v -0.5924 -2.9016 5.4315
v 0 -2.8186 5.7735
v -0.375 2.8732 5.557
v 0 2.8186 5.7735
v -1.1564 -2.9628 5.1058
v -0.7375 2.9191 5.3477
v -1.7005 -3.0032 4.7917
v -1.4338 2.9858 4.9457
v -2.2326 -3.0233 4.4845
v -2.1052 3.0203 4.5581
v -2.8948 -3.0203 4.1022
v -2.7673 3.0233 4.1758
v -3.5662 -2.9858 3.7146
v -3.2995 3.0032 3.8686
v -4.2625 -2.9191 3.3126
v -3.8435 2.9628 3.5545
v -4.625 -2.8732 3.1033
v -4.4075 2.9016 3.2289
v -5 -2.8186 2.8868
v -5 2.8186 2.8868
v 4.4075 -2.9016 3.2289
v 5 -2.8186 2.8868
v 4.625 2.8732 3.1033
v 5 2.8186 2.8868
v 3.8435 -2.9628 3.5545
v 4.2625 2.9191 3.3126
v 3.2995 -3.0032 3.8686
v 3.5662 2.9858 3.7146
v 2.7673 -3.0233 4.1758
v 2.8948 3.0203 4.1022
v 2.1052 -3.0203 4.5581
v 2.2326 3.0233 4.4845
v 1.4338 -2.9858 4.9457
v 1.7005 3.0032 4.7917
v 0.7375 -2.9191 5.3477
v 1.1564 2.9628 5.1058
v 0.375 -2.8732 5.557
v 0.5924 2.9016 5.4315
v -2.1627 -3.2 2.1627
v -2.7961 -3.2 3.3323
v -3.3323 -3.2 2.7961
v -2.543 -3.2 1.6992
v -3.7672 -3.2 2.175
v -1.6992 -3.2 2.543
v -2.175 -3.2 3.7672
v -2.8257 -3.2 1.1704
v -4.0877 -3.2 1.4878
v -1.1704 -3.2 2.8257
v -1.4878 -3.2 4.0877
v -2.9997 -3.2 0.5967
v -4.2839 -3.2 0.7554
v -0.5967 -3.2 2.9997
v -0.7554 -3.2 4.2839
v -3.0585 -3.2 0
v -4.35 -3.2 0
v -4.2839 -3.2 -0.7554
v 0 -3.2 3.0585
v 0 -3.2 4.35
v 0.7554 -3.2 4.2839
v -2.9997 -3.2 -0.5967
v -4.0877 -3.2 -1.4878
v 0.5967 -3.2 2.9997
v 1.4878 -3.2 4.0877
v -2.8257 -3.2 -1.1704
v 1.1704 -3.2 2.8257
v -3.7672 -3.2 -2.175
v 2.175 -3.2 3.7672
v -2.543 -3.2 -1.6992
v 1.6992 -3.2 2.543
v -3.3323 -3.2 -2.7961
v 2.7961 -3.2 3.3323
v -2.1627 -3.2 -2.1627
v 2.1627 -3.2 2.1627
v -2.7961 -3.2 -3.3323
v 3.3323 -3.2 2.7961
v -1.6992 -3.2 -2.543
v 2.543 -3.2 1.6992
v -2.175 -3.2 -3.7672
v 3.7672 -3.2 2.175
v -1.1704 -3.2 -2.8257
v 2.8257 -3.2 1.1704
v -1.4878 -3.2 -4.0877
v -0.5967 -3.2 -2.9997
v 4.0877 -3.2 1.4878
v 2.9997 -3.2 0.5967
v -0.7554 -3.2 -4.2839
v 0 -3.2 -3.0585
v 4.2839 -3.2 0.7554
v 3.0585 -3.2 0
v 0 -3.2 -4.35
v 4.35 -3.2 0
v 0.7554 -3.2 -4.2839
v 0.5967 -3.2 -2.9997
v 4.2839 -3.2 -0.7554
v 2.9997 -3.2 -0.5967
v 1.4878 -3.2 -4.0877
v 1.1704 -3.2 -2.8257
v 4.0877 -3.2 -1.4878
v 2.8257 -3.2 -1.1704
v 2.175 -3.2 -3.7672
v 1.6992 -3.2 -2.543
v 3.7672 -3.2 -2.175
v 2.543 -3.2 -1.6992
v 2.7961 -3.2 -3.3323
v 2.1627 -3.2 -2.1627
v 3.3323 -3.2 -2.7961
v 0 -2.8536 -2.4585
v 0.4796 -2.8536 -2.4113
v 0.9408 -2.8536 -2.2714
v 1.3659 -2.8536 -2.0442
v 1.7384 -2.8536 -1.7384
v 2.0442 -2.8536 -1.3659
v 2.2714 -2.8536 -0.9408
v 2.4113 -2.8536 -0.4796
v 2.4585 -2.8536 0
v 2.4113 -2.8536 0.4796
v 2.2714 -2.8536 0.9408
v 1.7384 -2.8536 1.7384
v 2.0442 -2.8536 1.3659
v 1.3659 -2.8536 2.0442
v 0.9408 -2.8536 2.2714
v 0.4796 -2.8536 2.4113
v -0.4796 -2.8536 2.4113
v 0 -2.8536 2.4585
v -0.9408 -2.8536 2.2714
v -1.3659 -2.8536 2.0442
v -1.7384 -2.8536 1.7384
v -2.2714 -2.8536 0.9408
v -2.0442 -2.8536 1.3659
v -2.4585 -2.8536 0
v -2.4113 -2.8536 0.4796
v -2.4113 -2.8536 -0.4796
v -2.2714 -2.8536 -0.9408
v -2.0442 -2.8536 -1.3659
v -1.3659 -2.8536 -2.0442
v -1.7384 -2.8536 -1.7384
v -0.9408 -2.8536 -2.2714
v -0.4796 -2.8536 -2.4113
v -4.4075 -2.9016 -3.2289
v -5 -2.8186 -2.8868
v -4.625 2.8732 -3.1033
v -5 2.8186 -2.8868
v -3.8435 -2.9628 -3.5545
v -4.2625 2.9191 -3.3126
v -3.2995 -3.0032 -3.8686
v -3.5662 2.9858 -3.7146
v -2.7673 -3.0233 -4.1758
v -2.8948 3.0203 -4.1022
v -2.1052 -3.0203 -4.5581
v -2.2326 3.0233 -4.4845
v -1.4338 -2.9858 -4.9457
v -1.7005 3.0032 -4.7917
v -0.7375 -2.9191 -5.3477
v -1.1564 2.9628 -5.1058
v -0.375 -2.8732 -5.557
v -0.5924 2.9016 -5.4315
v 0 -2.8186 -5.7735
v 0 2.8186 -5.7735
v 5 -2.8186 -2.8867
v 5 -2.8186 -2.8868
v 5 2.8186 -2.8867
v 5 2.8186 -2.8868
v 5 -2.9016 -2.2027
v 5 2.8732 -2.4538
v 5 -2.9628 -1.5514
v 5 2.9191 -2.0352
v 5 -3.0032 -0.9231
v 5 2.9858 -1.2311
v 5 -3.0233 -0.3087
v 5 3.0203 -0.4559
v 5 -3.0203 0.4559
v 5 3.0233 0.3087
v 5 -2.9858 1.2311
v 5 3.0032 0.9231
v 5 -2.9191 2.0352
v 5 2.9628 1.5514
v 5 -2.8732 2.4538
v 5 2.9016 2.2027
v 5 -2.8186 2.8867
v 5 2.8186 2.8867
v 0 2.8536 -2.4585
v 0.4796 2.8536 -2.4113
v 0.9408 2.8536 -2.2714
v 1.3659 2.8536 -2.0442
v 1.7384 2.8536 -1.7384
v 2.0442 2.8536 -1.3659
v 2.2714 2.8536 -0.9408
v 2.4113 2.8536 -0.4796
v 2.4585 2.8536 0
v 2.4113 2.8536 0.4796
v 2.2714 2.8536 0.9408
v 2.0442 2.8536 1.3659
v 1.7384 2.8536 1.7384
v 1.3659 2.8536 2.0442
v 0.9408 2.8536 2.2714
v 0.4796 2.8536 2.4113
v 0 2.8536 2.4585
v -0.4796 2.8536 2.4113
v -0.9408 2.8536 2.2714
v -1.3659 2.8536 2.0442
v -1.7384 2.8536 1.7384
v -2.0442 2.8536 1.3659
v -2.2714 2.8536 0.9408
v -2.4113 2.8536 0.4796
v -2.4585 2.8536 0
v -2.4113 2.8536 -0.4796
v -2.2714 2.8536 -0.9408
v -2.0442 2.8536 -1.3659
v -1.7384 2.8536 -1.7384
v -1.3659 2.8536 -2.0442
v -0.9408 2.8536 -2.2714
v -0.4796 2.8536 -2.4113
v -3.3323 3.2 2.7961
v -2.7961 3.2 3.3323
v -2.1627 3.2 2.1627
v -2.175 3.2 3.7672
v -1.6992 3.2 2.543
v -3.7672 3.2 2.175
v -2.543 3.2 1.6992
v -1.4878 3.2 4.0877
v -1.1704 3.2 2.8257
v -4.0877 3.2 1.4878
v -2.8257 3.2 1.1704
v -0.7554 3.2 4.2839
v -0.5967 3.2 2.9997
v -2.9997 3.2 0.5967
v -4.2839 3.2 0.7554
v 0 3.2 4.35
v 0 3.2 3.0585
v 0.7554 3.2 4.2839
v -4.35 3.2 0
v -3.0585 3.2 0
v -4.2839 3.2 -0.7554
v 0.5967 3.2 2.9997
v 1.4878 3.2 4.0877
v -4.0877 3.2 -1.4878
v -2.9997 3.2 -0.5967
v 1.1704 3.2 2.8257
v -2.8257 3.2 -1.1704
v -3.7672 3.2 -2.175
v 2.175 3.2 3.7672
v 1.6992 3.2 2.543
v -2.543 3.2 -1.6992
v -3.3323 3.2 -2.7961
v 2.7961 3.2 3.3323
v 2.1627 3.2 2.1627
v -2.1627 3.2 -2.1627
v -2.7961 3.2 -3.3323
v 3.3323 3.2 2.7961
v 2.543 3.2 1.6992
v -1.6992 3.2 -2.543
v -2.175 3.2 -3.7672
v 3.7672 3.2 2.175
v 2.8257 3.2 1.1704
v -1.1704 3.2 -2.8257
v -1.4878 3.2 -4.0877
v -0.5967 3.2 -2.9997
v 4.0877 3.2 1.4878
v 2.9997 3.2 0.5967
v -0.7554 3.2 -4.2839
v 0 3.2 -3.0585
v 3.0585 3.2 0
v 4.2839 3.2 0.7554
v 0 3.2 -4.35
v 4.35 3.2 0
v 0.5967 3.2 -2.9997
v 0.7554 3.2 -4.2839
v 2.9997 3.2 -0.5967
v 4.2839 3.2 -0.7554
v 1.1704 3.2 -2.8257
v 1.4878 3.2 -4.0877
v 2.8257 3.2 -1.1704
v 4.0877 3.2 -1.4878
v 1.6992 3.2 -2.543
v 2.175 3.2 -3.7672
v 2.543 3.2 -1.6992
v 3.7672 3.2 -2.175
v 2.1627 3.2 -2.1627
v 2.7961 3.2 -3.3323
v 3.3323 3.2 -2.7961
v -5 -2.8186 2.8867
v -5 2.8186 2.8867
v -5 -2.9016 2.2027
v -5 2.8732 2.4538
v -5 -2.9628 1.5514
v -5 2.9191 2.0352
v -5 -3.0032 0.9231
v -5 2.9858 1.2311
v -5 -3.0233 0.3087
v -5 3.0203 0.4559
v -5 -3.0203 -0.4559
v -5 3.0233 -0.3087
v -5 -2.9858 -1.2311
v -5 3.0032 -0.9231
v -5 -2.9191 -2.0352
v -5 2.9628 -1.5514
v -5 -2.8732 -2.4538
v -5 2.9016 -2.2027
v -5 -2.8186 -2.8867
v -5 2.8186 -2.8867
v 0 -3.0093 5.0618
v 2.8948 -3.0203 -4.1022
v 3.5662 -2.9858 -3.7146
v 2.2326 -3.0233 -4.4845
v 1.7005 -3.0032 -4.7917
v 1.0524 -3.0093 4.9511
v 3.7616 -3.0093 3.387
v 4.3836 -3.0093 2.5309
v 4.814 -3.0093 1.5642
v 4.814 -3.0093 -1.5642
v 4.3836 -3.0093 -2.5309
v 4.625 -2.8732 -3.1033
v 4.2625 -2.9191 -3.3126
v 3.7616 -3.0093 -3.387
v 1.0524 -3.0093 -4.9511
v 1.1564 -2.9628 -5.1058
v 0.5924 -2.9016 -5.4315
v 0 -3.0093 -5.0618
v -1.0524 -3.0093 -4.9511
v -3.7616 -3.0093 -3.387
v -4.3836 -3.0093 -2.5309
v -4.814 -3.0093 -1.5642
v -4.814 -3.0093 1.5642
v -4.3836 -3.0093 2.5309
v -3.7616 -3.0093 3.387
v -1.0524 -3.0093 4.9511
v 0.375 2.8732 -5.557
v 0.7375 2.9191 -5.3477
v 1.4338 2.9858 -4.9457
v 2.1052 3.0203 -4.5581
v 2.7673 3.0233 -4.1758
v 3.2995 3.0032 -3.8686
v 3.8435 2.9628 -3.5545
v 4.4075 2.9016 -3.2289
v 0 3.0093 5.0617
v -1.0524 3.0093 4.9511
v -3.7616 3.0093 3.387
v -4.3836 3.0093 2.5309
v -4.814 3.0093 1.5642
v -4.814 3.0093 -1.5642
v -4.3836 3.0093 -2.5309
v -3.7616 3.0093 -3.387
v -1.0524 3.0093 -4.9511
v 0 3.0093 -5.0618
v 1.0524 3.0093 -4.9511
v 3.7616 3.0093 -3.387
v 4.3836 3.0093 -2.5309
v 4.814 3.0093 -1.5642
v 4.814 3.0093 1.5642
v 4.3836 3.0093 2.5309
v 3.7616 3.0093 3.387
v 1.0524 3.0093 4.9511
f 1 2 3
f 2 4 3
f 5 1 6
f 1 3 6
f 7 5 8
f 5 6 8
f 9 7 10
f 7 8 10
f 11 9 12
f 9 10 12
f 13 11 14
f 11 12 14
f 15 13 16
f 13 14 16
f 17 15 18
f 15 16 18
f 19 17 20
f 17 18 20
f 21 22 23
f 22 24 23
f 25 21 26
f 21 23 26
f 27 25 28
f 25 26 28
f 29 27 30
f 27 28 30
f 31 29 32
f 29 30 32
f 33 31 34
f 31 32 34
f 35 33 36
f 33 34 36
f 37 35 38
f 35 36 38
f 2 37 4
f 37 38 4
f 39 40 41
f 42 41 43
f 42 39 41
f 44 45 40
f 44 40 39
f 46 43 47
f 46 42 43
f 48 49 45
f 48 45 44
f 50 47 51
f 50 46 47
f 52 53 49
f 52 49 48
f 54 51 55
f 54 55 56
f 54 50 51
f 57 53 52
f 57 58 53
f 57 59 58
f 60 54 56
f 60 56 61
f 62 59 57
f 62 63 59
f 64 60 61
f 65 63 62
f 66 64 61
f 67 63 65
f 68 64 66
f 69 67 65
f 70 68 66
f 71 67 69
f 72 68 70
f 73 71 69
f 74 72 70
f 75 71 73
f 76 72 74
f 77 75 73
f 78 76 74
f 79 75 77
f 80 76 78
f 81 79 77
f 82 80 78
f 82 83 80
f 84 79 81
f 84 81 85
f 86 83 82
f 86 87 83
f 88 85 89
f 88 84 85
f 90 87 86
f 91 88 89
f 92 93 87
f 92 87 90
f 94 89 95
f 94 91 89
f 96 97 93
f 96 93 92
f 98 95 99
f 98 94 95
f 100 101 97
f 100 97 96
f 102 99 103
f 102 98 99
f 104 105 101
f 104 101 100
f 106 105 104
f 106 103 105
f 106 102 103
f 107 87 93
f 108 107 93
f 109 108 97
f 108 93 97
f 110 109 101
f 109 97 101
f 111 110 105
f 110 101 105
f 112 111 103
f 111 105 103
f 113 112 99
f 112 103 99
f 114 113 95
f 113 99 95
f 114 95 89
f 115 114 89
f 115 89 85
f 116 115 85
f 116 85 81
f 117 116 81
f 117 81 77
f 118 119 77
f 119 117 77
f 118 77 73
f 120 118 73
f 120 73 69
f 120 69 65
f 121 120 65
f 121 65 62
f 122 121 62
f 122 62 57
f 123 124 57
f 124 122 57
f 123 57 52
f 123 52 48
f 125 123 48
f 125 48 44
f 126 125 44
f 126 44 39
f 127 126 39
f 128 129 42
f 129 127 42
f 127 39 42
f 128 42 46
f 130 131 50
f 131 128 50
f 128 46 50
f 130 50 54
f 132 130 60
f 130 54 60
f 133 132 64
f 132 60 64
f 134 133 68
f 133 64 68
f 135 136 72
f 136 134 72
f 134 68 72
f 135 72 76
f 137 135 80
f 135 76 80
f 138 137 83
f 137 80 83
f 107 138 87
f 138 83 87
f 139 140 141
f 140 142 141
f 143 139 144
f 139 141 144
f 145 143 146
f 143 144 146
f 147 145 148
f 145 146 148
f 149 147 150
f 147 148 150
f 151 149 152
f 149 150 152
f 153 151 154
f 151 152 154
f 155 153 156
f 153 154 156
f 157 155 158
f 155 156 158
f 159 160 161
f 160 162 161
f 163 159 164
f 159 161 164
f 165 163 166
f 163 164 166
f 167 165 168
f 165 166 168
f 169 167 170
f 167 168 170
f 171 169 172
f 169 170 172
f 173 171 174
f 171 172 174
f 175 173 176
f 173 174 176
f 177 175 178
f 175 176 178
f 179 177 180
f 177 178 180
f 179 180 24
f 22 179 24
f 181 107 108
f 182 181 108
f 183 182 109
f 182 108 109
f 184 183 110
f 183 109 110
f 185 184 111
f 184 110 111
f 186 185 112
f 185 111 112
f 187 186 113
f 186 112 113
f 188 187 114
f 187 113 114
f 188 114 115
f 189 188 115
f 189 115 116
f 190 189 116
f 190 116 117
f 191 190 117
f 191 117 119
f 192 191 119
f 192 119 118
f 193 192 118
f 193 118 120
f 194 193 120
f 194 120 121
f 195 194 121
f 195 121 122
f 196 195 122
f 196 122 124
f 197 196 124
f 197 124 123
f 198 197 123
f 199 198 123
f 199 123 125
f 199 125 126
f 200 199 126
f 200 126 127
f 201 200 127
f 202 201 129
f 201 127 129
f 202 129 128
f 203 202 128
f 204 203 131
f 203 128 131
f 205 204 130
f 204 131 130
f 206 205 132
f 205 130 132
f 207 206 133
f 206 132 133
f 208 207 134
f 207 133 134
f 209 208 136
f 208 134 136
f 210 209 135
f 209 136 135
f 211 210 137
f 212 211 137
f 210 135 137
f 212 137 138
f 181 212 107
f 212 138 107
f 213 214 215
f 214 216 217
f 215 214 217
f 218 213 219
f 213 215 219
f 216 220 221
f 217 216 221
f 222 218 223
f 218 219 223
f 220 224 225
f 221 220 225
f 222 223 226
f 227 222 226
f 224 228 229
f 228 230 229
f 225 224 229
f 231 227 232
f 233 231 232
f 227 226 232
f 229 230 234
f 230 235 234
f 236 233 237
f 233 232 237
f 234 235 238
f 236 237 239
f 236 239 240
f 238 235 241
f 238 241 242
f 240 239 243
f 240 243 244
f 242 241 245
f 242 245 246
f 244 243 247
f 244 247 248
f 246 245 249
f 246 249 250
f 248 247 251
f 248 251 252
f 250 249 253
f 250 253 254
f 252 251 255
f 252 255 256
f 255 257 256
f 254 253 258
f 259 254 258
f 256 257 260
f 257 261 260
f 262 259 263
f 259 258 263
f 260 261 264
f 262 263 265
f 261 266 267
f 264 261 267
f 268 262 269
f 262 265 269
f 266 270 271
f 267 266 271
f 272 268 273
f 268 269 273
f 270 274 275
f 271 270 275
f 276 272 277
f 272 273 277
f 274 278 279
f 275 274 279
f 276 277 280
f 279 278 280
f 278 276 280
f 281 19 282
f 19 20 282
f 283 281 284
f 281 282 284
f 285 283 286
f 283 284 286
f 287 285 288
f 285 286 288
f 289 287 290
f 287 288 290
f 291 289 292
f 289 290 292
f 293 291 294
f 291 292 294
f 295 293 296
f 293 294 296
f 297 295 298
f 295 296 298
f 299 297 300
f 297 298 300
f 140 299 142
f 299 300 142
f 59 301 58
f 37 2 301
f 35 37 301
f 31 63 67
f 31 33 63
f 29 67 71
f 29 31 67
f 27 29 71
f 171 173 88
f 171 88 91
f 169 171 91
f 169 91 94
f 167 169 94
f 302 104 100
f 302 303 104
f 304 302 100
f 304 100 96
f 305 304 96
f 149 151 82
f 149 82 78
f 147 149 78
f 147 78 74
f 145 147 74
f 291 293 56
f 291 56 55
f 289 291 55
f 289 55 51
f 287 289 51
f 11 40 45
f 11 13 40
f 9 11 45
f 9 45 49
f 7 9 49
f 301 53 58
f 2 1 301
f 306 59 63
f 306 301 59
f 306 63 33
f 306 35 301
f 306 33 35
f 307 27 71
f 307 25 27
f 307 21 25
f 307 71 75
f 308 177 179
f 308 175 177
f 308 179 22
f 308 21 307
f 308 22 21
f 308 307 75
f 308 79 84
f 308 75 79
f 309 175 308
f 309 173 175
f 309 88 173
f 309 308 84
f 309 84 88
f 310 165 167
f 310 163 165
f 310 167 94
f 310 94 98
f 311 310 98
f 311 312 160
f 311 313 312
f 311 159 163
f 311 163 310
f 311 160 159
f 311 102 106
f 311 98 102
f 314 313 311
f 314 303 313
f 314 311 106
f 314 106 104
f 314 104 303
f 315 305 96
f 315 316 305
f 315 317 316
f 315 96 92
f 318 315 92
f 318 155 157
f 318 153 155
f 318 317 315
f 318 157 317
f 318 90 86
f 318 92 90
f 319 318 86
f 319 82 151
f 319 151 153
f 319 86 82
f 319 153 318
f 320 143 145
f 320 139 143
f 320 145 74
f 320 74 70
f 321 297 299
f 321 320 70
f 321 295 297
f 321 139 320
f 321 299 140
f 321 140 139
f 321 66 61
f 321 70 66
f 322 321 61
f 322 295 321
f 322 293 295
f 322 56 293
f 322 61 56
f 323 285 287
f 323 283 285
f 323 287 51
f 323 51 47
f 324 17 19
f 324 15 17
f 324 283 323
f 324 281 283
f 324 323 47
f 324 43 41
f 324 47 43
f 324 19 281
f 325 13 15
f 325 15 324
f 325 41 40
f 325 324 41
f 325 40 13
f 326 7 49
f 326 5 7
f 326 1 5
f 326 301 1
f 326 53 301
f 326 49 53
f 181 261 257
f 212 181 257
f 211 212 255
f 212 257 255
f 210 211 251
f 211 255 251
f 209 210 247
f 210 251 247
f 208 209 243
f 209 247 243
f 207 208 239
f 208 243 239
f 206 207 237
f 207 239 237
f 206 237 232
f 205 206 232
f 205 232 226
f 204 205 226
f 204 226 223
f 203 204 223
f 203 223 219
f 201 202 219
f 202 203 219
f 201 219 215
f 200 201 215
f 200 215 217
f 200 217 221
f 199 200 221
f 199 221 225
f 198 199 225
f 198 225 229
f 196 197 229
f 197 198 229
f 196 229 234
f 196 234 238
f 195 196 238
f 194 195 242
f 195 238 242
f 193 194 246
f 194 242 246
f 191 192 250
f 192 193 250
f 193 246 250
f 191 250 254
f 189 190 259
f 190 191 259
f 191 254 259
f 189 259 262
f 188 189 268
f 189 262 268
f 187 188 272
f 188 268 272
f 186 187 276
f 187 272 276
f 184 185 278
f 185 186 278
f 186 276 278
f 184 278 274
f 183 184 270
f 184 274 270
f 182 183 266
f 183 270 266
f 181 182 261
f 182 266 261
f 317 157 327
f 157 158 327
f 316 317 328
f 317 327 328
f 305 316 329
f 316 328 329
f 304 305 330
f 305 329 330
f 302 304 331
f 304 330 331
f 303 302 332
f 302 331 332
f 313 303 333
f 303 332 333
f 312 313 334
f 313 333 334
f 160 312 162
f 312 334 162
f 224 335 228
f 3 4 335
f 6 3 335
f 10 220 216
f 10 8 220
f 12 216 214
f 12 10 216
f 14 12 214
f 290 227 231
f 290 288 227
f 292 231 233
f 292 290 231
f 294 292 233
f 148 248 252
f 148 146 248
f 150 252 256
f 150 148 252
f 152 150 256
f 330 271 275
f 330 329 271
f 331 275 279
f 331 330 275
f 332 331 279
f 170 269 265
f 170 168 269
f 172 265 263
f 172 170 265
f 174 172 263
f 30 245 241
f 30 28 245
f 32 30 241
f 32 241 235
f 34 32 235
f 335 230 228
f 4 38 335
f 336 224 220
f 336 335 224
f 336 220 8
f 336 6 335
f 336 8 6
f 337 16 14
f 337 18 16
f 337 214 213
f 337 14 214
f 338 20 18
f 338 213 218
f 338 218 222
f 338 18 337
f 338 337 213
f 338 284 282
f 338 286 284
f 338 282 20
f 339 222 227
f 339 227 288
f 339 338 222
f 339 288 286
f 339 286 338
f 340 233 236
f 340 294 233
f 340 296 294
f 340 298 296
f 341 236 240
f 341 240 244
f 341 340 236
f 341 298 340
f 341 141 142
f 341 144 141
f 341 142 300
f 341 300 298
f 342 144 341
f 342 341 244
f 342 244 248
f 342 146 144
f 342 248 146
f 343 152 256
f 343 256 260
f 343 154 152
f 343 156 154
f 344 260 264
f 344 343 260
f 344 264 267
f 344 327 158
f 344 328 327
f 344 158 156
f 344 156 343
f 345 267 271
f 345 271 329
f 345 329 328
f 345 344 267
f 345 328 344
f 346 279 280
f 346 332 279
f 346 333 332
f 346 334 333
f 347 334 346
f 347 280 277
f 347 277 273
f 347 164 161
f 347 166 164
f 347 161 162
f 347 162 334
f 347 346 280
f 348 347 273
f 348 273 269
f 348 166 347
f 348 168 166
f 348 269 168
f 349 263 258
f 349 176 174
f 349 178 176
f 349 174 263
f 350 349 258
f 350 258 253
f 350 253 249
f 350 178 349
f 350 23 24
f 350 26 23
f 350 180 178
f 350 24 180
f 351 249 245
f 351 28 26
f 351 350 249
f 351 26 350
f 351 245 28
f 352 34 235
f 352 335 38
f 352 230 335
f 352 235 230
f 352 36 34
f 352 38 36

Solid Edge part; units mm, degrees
sketch "Sketch1" plane through (0, 0, 0) normal (0, -1, 0) x (1, 0, 0)
  line L0 (5, 2.8868) -> (0, 5.7735)
  line L1 (0, 5.7735) -> (-5, 2.8868)
  line L2 (-5, 2.8868) -> (-5, -2.8868)
  line L3 (-5, -2.8868) -> (0, -5.7735)
  line L4 (0, -5.7735) -> (5, -2.8868)
  line L5 (5, -2.8868) -> (5, 2.8868)
extrude "Protrusion1" add sketch "Sketch1" along normal mid plane 6.4
sketch "Sketch2" plane through (0, 0, 0) normal (1, 0, 0) x (0, 1, 0)
  line L0 (-3.2, 4.35) -> (-2.8186, 5.7735)
revolve "RevolvedCutout1" cut sketch "Sketch2" angle 360 about axis through (0, 0, 0) along (0, -1, 0) material side at (0, -3.0576, 5.0747)
mirror "Mirror1" about plane through (0, 0, 0) normal (0, -1, 0) of "RevolvedCutout1"
hole "孔_7" at (0, -3.2, 0) direction (0, 1, 0) diameter 4.917 end up to next start chamfer 0.6 start chamfer angle 60 end chamfer 0.6 end chamfer angle 60
properties part number "N2611-2312" material "铝 1060"
